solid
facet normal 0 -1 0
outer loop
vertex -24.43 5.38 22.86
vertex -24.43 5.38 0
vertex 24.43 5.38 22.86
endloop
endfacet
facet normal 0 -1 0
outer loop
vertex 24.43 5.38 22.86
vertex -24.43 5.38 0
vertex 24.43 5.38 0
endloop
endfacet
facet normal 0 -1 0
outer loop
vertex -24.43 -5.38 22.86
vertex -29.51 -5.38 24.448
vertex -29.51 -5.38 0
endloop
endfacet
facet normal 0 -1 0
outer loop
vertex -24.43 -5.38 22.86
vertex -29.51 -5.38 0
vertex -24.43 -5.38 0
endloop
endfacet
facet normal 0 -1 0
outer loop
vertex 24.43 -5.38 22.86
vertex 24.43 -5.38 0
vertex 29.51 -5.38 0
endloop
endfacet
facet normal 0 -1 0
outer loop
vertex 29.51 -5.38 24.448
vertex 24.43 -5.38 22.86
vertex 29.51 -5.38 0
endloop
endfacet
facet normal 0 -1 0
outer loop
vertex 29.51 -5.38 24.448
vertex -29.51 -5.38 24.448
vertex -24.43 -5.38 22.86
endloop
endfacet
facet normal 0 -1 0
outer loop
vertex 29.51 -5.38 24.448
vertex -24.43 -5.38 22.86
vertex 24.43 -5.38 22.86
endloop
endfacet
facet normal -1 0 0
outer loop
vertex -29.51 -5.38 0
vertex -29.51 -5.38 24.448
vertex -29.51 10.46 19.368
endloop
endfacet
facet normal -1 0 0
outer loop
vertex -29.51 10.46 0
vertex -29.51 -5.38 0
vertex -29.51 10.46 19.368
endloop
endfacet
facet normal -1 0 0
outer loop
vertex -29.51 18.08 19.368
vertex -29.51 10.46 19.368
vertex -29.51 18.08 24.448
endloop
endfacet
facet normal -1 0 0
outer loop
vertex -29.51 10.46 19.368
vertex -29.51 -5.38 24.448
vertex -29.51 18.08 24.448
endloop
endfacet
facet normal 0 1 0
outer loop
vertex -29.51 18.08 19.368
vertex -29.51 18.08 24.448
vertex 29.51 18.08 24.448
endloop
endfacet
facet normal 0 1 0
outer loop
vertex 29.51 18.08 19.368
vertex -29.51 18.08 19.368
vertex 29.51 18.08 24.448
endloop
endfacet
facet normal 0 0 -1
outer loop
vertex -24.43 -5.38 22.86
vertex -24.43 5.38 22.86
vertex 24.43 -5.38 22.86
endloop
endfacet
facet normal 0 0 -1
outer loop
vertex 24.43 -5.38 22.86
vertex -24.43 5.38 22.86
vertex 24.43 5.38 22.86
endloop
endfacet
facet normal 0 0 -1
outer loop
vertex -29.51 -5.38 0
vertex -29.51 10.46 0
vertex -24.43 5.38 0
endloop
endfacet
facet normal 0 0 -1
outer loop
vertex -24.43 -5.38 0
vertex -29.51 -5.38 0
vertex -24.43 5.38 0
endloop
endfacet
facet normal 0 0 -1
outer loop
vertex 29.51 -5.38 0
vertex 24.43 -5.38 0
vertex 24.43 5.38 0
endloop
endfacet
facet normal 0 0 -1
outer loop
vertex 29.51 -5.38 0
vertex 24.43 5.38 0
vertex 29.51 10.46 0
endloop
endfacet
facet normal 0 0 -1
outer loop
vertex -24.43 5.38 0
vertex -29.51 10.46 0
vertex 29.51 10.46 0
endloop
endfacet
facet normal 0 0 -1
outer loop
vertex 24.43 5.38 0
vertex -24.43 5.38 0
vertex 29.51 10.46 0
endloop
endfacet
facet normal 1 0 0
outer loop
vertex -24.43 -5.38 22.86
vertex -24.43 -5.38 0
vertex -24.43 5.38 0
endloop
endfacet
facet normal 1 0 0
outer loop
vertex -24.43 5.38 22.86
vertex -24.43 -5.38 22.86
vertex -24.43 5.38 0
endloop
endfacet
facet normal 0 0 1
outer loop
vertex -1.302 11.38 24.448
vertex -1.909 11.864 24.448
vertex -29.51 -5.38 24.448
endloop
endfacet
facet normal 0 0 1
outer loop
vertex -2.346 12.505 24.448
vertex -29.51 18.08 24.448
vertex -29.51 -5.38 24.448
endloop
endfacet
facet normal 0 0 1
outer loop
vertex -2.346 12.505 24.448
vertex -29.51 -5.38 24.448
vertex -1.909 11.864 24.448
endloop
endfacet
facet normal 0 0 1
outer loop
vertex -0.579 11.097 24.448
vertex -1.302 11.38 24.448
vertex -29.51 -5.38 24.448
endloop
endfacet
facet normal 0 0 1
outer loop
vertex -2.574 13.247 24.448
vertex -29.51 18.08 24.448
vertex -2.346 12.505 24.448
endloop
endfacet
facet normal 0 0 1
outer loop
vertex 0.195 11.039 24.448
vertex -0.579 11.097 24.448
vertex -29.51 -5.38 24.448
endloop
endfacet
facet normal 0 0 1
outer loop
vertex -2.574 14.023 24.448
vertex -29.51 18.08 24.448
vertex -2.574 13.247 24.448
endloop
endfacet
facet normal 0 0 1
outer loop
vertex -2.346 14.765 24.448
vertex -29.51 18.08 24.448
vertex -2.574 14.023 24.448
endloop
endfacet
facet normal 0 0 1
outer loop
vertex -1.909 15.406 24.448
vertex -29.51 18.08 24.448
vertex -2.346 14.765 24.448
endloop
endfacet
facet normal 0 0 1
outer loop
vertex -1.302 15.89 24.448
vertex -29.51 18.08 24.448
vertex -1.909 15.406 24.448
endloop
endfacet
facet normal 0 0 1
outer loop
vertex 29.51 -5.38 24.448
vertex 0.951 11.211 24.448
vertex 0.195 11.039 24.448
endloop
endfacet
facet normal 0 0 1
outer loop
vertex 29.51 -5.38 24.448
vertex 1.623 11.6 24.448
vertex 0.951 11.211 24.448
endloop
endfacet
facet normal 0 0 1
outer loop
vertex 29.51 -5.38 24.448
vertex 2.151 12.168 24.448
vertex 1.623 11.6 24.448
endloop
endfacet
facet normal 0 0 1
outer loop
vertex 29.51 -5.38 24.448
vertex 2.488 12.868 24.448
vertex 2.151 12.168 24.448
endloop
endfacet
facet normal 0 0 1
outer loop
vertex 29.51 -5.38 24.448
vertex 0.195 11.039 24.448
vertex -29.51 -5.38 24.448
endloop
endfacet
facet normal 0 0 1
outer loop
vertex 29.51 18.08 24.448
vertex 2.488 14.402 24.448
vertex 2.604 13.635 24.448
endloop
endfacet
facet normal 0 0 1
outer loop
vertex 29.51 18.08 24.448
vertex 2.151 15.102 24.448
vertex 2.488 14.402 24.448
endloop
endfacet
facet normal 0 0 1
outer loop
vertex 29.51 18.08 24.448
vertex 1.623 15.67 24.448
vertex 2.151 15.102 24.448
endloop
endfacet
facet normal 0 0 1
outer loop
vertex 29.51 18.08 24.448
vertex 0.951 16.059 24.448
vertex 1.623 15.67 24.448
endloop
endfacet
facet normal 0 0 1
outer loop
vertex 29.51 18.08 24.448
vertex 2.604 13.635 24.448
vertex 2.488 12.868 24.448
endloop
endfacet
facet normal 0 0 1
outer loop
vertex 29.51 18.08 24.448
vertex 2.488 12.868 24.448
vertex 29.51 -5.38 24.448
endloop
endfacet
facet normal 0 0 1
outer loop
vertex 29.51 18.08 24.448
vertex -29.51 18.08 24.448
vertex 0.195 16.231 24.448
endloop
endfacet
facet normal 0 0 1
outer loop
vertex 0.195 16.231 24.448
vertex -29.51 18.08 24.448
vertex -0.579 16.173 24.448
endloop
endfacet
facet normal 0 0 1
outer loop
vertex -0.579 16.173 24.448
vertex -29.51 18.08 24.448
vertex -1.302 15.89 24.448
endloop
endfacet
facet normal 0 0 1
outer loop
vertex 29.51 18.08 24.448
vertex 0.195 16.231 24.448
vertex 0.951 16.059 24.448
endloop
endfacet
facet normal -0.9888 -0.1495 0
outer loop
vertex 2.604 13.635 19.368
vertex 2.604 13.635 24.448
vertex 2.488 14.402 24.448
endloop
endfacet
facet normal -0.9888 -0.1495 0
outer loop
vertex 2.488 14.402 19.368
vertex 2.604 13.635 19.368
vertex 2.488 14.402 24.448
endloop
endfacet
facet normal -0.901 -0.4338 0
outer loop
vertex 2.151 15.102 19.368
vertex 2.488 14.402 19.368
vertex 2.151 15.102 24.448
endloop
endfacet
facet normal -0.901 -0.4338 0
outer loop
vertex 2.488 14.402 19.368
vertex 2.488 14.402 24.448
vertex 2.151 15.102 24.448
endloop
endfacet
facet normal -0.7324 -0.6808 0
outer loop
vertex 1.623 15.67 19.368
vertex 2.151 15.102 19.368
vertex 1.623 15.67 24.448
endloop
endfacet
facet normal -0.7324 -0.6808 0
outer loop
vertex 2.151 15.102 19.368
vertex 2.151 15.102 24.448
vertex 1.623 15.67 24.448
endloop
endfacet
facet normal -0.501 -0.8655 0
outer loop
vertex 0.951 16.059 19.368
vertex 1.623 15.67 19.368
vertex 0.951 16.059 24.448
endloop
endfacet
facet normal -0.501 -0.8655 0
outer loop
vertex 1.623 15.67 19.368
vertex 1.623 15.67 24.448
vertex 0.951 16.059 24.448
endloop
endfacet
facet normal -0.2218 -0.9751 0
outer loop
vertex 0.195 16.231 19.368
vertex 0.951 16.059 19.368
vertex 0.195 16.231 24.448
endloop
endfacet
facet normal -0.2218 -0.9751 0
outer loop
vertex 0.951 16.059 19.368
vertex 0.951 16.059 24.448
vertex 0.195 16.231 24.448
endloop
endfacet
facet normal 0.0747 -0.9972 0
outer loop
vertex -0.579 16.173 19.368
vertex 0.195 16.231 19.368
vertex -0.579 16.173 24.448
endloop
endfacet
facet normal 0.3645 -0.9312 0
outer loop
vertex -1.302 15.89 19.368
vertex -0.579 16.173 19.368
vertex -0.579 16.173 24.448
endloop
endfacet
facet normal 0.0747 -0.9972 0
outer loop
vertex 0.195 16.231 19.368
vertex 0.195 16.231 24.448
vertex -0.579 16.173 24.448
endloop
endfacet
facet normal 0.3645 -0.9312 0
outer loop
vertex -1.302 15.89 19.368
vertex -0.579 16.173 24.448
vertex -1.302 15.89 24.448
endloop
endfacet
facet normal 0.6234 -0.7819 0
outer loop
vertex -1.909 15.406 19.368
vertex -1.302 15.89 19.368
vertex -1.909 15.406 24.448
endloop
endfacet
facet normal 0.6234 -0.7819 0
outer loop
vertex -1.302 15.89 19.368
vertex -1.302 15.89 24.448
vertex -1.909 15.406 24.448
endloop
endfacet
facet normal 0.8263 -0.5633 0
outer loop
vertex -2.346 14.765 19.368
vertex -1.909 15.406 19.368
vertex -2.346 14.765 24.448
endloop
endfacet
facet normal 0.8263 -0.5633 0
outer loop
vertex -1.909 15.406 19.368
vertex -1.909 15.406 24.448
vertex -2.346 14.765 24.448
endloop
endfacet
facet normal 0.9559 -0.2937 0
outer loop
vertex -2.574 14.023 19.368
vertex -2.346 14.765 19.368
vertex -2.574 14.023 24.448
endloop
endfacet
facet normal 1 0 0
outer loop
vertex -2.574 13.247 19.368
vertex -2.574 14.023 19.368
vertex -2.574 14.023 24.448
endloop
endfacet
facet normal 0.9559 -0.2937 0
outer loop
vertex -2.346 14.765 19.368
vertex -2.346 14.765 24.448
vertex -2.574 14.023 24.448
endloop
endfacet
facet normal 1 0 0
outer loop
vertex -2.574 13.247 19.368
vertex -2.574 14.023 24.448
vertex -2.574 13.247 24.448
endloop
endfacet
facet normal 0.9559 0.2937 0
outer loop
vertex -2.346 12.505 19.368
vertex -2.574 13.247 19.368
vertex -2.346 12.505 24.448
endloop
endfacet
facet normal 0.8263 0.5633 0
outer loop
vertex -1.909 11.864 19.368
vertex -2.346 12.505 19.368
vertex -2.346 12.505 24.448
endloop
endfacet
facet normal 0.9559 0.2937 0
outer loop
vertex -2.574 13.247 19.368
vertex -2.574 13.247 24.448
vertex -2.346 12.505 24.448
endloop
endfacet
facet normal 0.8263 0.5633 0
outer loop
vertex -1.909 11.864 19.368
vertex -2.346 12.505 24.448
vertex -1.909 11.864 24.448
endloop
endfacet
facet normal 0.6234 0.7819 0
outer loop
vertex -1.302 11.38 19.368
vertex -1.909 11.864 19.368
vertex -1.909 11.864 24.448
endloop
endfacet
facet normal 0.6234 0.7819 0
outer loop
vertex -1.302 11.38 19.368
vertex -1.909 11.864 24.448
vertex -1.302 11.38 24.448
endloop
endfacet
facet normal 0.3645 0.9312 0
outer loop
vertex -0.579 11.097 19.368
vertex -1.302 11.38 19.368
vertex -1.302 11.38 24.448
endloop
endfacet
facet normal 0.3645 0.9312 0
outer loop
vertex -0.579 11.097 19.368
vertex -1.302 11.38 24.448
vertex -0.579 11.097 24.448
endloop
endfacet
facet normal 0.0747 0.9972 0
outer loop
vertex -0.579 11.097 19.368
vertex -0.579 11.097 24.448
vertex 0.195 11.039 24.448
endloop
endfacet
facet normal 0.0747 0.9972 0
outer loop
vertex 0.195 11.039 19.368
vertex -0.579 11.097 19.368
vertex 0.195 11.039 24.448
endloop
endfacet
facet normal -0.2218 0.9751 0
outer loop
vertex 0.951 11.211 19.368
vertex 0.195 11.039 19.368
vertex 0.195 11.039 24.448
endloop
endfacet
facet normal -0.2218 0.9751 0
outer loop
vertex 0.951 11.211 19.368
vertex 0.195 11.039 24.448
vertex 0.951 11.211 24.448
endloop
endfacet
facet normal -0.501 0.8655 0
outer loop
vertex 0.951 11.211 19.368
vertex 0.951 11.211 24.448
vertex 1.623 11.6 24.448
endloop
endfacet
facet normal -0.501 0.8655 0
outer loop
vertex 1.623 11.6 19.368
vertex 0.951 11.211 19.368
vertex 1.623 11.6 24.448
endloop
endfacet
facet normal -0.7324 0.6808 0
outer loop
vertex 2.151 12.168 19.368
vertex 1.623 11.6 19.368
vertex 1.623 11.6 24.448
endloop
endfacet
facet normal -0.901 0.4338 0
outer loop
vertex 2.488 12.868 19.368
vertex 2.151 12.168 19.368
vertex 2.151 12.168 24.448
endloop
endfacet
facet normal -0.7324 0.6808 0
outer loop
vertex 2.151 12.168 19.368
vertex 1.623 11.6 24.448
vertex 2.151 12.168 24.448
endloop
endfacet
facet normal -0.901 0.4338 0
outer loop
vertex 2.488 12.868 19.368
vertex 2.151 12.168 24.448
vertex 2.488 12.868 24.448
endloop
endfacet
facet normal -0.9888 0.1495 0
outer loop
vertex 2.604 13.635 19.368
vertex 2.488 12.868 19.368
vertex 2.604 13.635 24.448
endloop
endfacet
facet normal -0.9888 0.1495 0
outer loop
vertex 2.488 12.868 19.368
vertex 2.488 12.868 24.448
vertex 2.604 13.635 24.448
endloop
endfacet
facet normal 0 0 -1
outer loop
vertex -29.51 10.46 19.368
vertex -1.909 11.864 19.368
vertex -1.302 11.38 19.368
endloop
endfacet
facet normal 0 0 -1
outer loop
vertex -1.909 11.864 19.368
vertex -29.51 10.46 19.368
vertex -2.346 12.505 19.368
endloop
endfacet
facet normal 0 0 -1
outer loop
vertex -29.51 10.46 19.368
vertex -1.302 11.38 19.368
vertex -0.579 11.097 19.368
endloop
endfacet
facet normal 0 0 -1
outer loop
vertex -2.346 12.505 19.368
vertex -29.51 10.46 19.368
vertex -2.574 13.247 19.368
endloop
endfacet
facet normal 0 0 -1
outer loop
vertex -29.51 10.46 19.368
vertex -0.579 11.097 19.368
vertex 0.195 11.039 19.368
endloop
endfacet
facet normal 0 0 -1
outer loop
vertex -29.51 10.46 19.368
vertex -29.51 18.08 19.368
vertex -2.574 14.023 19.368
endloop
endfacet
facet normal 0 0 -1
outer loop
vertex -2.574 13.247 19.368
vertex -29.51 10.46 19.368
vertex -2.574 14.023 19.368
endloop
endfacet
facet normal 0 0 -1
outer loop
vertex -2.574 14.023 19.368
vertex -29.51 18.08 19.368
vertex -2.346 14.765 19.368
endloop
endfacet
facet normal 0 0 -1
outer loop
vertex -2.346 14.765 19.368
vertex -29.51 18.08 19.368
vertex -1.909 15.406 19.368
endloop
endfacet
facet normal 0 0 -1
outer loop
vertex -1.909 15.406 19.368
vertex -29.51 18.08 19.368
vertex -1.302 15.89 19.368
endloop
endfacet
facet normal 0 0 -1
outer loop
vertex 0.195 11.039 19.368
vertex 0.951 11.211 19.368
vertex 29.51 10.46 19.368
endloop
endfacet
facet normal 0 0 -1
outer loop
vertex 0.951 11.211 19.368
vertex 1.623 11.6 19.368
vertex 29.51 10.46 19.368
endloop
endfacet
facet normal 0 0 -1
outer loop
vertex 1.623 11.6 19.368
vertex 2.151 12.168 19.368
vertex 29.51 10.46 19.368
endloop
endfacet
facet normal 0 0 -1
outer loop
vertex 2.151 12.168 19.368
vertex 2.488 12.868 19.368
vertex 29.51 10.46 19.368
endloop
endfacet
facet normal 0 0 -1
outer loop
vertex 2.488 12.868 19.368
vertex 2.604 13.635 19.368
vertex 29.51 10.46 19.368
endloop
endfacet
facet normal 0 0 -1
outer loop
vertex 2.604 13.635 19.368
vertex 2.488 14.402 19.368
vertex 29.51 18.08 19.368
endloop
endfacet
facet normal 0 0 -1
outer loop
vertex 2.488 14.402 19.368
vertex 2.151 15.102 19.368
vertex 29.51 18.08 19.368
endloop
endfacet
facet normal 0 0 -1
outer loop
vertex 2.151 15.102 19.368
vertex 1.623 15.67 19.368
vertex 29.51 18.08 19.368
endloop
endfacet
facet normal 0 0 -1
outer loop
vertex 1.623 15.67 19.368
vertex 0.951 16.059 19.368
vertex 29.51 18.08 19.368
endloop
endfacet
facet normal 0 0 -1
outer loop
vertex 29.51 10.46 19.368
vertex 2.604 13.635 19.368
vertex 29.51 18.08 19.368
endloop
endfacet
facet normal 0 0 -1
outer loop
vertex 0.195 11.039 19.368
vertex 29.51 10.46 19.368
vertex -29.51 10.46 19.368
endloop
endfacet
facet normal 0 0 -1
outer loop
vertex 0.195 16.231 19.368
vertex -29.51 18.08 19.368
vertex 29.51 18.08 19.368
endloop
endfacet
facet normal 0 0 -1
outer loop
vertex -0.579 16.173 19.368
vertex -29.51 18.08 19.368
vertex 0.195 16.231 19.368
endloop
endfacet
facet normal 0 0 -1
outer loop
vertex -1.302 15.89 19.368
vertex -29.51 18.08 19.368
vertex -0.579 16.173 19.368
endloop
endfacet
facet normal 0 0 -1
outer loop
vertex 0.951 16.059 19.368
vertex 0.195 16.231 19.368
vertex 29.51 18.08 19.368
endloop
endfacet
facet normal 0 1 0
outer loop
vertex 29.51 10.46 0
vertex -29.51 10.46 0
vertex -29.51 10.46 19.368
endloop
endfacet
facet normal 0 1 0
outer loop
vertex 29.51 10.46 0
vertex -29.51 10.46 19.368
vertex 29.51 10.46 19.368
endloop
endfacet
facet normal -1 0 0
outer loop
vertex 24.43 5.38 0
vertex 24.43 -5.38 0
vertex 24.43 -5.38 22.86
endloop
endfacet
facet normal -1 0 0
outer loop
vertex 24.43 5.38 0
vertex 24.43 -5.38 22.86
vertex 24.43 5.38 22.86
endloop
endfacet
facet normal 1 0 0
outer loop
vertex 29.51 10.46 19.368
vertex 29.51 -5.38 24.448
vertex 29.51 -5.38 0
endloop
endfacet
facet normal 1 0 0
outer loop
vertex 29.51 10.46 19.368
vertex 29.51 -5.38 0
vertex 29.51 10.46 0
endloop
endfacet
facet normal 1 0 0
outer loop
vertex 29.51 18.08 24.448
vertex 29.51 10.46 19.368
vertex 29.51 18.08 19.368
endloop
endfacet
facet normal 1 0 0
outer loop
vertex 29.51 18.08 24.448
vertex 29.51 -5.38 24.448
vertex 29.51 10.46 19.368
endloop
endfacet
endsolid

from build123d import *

# Parameters (mm, degrees)
F0_W     = 59.02
F0_H     = 20.92
F0_W_2   = 48.86
F0_H_2   = 10.76
F1_DEPTH = 24.4475
F2_W     = 59.02
F2_H     = 7.62
F2_R     = 2.6035
F3_DEPTH = 5.08
F5_DEPTH = 24.4485
F6_W     = 48.86
F6_H     = 10.76
F7_DEPTH = 1.5875


with BuildPart() as f1:
    # F0 (on Top) → F1 (new body)
    with BuildSketch(Plane.XY):
        Rectangle(F0_W, F0_H)
        Rectangle(F0_W_2, F0_H_2, mode=Mode.SUBTRACT)
    extrude(amount=F1_DEPTH)

    # F2 (on face) → F3 (join)
    with BuildSketch(Plane.XY.offset(24.4475)):
        with Locations((0, 14.27)):
            Rectangle(F2_W, F2_H)
        with Locations((0, 13.635)):
            Circle(F2_R, mode=Mode.SUBTRACT)
    extrude(amount=-F3_DEPTH)

    # F4 (on face) → F5 (cut, through all)
    with BuildSketch(Plane(origin=(0, 0, 0), x_dir=(1, 0, 0), z_dir=(0, 0, -1))):
        Polygon((24.43, 5.38), (29.51, 5.38), (29.51, 10.46), (-29.51, 10.46), (-29.51, 5.38), (-24.43, 5.38), align=None)
    extrude(amount=-F5_DEPTH, mode=Mode.SUBTRACT)

    # F6 (on face) → F7 (join)
    with BuildSketch(Plane.XY.offset(24.4475)):
        Rectangle(F6_W, F6_H)
    extrude(amount=-F7_DEPTH)


solid = f1.part
